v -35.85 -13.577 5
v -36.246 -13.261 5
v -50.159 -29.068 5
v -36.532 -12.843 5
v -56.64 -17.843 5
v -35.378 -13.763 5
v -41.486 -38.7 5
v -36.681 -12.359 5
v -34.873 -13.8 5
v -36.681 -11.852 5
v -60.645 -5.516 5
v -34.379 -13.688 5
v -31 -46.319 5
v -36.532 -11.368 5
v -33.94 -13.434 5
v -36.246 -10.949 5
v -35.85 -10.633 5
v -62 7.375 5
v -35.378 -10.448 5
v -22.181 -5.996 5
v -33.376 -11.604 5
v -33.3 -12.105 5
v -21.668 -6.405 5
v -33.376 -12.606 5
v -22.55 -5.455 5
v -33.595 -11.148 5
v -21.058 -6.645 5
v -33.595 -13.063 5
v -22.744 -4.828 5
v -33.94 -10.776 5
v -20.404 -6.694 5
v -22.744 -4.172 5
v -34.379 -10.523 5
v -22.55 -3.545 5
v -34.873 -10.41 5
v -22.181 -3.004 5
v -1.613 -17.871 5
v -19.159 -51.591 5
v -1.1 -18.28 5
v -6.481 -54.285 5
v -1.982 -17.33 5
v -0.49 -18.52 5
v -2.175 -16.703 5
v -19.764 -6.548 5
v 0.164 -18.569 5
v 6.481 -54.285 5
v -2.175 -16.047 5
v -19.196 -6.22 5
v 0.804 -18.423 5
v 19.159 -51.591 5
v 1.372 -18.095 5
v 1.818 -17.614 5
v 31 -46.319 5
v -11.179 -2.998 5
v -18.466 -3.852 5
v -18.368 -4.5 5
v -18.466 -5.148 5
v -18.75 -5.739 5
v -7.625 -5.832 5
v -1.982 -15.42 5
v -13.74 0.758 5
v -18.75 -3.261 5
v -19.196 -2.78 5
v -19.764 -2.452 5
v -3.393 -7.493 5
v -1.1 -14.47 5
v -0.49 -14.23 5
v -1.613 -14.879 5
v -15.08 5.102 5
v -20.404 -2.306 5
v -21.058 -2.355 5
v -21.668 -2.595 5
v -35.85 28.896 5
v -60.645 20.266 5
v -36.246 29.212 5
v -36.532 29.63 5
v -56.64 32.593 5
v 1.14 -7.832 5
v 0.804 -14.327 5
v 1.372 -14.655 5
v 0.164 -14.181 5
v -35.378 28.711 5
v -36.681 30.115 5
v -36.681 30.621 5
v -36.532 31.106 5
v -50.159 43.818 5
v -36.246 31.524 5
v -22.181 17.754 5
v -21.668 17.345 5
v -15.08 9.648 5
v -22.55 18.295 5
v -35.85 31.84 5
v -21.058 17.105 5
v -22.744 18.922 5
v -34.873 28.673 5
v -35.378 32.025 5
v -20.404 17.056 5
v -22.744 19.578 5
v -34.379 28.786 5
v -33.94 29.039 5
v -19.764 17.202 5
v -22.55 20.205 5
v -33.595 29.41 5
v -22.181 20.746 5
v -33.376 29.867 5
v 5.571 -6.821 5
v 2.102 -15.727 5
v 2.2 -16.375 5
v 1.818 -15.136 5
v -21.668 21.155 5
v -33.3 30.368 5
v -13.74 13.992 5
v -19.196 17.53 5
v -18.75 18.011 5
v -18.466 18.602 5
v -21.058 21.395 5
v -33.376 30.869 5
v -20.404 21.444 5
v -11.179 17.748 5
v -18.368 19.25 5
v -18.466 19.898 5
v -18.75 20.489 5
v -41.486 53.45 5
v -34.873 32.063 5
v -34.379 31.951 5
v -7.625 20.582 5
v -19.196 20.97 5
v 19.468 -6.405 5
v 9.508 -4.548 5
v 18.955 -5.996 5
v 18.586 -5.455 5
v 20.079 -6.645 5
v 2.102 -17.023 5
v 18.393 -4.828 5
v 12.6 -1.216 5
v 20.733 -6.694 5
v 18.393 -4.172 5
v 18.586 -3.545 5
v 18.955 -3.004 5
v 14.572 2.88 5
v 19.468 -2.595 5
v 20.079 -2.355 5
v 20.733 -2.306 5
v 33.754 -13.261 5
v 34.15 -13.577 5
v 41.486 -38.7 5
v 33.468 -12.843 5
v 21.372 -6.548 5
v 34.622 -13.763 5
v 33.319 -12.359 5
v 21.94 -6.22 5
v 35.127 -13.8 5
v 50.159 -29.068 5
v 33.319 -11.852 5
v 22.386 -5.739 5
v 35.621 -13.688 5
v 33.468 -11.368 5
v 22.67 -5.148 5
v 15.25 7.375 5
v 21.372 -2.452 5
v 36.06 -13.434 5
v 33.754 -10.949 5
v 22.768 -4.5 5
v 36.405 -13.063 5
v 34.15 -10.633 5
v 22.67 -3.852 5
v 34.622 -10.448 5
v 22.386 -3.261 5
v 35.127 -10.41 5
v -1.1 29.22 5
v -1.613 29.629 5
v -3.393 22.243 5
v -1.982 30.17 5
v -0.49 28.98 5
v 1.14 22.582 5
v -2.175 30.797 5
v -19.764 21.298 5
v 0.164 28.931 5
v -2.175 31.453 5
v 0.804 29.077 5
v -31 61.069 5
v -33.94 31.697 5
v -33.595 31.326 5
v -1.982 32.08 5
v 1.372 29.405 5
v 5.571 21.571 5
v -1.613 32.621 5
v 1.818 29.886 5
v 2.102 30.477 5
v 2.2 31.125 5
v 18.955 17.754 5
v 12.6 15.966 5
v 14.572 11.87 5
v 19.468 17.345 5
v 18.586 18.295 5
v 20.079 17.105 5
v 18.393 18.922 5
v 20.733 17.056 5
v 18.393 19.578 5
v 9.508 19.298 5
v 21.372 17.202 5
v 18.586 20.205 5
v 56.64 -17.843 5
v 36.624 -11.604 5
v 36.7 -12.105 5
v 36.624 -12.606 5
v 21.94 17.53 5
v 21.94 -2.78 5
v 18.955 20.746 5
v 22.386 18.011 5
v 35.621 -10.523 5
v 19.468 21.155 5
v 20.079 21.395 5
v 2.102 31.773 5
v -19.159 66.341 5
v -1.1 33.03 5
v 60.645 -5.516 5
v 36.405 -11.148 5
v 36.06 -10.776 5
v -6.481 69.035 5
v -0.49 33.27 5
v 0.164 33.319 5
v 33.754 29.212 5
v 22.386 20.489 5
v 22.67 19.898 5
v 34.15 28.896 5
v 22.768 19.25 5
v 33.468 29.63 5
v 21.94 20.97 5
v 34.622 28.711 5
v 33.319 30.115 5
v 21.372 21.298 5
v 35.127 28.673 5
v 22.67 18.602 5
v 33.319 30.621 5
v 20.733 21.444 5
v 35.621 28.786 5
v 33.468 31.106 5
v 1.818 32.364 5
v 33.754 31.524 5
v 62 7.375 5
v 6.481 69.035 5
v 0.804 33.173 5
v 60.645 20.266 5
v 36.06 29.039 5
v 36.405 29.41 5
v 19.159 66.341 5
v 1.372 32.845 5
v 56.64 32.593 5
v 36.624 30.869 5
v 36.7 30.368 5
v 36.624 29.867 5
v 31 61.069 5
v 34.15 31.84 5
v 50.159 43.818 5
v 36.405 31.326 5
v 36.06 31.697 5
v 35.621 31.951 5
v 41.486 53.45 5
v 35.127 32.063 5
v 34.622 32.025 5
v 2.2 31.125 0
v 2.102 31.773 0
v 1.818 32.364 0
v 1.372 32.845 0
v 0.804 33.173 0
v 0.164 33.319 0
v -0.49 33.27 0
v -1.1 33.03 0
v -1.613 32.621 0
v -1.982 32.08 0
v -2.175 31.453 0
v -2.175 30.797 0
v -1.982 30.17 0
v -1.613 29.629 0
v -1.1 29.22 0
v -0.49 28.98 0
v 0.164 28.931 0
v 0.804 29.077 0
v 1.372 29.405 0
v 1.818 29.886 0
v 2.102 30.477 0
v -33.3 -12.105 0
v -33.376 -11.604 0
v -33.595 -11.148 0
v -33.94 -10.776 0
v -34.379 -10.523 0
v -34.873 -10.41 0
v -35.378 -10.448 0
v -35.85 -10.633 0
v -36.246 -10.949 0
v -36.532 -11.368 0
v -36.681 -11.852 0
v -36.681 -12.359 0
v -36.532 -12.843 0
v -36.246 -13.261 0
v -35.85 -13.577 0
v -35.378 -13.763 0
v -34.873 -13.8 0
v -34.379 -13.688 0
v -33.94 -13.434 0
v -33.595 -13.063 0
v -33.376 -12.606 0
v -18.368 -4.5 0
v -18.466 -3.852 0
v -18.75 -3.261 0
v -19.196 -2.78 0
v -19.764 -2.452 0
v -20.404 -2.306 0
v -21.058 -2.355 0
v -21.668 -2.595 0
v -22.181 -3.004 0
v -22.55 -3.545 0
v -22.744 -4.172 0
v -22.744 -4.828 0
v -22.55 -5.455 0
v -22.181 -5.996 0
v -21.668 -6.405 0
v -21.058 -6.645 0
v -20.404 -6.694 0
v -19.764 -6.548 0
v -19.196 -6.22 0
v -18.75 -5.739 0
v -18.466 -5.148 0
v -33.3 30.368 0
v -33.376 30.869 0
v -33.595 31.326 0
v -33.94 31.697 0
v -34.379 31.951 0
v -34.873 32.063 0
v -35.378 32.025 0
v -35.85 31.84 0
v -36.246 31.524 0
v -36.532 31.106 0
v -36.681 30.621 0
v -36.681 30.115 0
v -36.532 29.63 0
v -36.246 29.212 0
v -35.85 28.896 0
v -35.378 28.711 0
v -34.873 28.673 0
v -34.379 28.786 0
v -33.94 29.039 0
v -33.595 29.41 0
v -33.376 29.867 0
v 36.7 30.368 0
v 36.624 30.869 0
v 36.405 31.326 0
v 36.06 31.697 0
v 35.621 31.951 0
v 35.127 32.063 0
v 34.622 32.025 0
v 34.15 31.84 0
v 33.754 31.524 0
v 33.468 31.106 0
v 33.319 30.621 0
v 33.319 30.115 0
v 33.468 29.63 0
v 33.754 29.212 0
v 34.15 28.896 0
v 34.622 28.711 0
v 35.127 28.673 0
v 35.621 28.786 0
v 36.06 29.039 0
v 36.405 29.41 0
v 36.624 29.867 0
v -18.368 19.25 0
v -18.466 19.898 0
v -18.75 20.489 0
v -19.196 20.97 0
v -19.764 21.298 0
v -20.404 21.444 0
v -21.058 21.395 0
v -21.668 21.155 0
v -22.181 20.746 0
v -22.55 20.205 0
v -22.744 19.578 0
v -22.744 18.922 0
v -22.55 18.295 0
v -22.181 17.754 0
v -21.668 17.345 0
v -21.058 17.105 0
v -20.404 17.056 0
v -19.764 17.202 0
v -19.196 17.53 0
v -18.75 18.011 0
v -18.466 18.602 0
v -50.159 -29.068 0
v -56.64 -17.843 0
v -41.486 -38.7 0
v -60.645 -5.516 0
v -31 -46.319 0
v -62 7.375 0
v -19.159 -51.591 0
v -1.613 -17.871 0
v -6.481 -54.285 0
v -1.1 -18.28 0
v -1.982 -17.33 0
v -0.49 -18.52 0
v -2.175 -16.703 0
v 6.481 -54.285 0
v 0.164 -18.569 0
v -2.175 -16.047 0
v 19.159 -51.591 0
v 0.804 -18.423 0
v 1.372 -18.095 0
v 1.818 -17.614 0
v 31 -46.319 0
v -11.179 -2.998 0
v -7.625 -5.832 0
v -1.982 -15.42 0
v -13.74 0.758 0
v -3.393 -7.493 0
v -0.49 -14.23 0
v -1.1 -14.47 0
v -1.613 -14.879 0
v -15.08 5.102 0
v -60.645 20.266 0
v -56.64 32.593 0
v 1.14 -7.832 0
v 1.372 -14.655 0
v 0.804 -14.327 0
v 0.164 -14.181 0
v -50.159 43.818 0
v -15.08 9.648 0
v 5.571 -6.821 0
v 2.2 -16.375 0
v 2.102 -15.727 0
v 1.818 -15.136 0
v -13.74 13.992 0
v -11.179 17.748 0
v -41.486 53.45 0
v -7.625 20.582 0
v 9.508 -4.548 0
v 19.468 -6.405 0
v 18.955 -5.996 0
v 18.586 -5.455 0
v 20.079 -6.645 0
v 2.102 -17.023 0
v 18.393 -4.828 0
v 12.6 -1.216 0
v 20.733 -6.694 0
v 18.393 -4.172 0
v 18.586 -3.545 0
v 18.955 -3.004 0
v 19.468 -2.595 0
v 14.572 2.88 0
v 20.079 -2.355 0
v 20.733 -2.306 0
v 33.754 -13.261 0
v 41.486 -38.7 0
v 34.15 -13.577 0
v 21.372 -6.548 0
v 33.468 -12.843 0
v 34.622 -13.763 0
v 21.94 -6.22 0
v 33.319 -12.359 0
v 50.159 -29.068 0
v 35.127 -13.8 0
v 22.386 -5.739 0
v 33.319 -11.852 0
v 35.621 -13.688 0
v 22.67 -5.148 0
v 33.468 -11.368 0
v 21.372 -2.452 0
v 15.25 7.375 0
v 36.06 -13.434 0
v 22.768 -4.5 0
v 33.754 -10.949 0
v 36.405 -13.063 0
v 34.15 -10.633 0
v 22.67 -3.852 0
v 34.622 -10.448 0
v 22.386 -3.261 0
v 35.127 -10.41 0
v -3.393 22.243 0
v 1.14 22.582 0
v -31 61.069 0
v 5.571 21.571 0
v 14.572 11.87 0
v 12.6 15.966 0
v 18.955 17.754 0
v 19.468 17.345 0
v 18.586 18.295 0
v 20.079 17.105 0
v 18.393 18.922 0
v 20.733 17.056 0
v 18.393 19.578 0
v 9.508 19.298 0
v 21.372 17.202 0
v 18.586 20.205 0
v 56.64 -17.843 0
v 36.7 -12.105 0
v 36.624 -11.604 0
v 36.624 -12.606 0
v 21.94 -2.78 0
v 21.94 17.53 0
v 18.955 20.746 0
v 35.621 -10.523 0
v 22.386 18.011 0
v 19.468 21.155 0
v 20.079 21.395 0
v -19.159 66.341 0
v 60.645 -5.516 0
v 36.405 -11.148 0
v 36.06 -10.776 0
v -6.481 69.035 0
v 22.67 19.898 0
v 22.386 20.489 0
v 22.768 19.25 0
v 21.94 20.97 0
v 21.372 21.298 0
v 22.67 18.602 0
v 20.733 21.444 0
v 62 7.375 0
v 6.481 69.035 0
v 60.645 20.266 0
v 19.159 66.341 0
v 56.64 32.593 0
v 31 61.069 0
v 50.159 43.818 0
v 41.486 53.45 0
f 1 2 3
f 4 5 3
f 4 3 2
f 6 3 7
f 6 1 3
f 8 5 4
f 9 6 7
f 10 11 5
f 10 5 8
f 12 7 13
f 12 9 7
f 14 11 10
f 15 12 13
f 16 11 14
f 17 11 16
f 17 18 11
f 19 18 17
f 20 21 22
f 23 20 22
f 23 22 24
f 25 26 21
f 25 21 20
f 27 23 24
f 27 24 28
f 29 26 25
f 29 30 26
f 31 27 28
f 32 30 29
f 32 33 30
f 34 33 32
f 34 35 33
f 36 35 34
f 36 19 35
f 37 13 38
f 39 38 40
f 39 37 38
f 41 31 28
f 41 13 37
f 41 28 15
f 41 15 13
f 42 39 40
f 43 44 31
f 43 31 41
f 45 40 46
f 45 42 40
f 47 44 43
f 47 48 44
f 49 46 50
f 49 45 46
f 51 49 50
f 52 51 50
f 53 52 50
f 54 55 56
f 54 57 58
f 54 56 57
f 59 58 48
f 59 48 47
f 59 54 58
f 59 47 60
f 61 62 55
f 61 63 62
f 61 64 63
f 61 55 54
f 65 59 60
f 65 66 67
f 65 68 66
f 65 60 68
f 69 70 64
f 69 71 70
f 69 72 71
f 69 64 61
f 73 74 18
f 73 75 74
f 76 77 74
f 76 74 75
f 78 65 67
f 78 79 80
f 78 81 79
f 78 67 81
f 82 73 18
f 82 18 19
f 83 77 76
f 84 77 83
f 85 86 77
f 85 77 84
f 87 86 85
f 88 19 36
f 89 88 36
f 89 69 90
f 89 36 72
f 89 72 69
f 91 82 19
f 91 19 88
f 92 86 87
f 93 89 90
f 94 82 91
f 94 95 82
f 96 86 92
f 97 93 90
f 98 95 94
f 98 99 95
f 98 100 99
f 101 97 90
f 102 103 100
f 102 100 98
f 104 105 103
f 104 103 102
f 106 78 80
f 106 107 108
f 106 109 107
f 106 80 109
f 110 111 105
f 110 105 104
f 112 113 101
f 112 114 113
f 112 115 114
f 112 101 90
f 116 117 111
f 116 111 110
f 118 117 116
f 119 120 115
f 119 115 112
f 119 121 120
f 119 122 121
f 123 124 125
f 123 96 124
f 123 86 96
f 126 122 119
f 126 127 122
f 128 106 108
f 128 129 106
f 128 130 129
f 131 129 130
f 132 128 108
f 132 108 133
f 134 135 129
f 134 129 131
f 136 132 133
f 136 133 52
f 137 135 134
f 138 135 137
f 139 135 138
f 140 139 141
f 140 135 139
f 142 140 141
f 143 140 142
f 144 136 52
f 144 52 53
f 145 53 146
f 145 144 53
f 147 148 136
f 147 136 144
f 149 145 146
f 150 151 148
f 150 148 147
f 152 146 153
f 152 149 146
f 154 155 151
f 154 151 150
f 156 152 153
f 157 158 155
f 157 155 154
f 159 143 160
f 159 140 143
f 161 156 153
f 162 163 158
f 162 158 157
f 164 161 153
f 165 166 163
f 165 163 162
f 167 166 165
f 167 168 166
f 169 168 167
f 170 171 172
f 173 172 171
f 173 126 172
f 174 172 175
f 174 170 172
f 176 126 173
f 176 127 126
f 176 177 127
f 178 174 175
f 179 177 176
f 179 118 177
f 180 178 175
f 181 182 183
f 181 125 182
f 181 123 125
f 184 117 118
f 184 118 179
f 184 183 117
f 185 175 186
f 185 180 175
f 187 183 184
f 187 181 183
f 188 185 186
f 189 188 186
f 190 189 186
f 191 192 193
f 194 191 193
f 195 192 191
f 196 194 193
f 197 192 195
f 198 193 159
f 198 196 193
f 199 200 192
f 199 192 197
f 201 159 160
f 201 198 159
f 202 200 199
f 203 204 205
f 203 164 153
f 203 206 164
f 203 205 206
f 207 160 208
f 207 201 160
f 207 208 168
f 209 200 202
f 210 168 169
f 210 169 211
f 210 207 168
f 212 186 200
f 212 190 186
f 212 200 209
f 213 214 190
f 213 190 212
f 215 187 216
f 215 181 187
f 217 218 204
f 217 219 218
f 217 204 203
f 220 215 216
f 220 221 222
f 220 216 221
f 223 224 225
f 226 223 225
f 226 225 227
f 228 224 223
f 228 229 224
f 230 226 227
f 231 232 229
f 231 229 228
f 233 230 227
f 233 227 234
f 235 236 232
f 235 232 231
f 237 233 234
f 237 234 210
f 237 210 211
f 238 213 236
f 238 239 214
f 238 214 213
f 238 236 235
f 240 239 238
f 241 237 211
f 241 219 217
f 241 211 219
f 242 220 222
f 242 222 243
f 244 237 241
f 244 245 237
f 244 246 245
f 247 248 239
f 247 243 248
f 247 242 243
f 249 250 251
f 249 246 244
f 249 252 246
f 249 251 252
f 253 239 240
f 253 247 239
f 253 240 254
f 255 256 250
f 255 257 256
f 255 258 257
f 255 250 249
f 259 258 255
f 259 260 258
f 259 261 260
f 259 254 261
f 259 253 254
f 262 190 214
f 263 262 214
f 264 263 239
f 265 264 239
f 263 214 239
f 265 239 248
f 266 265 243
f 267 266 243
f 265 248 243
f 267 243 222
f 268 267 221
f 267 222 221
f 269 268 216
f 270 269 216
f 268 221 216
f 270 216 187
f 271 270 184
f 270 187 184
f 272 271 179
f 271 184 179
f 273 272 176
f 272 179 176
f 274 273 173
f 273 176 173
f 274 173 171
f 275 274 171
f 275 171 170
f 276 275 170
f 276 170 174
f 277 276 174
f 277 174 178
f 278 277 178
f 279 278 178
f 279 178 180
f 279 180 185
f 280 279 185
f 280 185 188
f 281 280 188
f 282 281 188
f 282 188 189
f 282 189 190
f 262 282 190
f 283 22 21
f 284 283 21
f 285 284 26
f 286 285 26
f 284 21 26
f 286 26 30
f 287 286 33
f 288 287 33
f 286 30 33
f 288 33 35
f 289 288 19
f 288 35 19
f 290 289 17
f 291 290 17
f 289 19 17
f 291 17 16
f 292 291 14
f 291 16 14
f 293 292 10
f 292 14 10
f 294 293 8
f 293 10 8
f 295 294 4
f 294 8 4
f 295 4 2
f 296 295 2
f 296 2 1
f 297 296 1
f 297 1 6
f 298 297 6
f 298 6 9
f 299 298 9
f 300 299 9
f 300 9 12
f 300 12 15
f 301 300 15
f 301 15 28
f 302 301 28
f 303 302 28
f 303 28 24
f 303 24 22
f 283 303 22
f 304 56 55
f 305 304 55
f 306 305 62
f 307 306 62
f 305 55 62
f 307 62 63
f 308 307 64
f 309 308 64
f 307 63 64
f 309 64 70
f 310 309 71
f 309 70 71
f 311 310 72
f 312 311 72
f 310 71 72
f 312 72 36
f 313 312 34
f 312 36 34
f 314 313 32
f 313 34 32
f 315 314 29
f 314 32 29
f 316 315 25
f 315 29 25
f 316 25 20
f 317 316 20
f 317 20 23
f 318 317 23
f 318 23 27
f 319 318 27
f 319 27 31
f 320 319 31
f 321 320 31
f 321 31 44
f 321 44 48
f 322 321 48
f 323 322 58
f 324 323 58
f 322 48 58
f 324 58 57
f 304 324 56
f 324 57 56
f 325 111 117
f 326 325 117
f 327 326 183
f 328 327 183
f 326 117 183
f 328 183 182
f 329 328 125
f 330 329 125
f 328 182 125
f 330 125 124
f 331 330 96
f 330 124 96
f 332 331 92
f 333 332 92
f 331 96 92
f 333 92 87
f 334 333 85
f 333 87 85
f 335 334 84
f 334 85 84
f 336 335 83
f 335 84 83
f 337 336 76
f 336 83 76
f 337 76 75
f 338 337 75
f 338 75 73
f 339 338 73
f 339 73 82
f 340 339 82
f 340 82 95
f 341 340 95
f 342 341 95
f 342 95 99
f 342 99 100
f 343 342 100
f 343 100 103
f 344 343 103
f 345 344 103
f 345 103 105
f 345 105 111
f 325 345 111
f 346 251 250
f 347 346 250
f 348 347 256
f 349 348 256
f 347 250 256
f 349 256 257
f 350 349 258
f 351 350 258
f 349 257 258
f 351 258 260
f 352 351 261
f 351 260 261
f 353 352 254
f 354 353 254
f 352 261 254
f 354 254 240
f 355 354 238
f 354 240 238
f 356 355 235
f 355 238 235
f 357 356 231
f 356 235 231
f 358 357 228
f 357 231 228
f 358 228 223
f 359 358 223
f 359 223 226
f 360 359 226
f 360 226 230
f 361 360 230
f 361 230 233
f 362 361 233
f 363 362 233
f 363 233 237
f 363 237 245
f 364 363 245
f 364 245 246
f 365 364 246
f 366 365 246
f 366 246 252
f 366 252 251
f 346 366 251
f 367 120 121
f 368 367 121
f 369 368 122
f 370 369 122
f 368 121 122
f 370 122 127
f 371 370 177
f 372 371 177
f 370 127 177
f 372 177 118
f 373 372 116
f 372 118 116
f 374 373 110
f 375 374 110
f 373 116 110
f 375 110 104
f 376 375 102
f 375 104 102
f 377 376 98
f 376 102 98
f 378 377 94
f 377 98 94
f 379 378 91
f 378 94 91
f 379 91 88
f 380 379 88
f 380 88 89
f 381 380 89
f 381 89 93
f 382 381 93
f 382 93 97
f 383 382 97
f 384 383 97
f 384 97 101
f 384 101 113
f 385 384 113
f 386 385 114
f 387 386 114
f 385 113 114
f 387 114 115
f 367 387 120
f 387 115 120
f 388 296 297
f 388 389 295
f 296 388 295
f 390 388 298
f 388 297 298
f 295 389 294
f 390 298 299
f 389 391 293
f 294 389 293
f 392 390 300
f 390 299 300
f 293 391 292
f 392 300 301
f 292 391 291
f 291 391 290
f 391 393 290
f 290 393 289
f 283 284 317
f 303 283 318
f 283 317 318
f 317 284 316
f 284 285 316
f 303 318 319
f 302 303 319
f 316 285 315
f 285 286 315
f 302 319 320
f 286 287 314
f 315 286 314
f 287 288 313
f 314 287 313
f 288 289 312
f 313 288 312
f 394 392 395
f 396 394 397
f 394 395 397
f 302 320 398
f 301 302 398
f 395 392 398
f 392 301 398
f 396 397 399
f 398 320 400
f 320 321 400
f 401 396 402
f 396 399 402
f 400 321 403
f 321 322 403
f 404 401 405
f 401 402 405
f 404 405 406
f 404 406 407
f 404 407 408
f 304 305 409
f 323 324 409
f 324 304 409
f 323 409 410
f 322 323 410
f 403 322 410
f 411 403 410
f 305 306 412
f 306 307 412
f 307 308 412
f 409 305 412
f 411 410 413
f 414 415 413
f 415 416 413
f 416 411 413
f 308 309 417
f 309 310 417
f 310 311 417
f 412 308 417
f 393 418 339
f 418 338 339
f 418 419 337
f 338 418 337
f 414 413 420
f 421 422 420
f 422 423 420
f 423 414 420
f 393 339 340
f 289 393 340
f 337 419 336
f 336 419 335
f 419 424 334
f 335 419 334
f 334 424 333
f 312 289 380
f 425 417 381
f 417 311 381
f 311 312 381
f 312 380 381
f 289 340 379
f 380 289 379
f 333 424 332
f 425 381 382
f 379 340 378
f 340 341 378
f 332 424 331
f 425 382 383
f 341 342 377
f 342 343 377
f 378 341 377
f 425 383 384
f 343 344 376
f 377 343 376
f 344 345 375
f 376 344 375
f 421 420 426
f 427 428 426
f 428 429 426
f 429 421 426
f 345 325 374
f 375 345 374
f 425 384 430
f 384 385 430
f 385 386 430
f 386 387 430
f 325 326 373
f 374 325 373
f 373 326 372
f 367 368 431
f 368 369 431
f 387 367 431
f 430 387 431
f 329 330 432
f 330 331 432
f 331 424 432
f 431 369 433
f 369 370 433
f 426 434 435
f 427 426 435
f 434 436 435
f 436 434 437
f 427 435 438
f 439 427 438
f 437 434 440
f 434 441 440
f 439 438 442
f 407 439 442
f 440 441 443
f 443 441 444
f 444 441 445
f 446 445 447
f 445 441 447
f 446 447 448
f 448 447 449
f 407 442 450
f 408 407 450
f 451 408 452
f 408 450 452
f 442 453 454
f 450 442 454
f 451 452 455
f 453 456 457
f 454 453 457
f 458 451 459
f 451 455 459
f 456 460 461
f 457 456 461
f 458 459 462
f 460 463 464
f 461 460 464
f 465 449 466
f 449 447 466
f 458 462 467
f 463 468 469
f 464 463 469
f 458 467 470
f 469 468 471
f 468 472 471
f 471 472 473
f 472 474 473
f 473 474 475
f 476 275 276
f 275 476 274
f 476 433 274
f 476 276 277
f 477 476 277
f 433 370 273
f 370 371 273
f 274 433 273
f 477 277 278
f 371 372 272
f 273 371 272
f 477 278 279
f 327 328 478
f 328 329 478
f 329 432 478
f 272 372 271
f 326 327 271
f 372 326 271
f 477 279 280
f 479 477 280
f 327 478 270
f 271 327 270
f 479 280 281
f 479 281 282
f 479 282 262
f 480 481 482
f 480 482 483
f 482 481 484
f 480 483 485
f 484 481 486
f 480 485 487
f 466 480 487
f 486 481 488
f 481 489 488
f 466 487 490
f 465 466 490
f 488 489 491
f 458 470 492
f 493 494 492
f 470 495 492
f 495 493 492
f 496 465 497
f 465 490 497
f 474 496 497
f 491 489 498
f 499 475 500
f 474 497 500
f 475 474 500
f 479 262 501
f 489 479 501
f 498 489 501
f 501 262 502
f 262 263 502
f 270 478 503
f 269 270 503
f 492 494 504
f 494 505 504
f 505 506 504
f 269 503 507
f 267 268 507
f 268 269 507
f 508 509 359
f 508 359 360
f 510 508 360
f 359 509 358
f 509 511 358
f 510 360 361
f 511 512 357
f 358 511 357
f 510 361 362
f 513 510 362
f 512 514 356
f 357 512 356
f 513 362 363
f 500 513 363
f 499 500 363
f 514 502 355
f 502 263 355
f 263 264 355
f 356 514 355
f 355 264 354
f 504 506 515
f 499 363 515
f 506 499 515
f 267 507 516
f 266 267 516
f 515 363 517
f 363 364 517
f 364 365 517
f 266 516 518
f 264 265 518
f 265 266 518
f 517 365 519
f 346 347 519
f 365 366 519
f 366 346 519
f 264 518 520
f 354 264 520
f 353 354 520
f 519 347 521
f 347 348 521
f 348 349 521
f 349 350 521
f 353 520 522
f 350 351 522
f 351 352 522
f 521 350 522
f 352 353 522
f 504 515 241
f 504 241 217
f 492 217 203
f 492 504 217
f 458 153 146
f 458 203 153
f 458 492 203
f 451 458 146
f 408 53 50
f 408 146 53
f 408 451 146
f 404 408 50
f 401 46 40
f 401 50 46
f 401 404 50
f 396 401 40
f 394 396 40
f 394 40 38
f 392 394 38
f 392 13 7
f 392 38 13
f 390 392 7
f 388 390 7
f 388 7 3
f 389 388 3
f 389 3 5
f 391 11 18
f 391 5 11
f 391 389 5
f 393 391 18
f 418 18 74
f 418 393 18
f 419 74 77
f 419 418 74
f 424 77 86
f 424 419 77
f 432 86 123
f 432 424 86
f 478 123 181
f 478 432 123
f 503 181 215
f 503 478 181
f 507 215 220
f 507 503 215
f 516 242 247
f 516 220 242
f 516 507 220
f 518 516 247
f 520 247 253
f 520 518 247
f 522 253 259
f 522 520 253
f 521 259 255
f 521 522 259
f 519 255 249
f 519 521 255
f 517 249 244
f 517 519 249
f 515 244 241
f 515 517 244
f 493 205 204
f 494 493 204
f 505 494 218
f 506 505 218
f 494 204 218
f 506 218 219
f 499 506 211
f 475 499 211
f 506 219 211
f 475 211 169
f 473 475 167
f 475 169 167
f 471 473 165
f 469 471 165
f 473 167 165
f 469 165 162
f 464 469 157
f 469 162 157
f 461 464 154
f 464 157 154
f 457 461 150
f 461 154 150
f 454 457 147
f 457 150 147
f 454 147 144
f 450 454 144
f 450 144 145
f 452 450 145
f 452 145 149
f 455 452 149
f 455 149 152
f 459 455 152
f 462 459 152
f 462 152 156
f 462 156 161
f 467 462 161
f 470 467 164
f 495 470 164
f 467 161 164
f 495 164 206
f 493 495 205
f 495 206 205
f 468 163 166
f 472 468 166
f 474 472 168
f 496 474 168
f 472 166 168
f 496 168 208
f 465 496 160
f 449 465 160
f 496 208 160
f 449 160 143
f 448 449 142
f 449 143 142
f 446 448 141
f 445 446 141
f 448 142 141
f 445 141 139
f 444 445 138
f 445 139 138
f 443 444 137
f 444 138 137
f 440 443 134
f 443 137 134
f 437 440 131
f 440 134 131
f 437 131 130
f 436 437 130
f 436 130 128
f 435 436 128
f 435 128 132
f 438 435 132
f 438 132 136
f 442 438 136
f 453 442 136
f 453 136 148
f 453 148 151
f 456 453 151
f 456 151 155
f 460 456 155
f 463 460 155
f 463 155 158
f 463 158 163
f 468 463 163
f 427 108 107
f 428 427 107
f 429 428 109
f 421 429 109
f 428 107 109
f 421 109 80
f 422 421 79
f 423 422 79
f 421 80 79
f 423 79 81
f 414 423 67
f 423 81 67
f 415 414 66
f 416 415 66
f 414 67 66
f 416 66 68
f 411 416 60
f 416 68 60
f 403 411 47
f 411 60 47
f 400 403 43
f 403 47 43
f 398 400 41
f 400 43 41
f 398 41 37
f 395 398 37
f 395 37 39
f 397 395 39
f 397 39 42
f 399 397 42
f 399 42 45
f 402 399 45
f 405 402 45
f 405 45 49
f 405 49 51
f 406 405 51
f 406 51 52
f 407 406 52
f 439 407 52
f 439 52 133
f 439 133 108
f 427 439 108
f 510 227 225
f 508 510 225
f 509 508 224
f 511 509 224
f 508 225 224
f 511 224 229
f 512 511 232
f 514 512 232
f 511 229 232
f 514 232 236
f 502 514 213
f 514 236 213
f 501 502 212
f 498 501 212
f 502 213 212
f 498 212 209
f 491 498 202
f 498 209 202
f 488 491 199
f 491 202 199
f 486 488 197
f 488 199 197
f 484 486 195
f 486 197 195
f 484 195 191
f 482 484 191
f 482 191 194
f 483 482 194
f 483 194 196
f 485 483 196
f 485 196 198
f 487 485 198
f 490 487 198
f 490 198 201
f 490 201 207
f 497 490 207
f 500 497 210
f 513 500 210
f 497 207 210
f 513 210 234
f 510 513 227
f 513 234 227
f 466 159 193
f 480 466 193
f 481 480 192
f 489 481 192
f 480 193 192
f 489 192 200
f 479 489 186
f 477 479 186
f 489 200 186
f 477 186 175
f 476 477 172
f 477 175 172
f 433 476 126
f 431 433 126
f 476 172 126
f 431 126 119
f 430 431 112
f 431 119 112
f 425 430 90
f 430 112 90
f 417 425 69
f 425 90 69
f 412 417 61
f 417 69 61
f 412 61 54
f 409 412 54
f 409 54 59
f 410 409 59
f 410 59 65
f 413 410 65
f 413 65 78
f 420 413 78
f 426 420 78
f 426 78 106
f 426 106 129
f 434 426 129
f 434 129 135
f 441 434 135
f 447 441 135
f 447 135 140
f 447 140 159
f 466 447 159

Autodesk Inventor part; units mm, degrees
ref_plane "YZ Plane" through (0, 0, 0) normal (1, 0, 0) x (0, 1, 0)
ref_plane "XZ Plane" through (0, 0, 0) normal (0, 1, 0) x (-1, 0, 0)
ref_plane "XY Plane" through (0, 0, 0) normal (0, 0, 1) x (1, 0, 0)
sketch "Base" plane through (0, 0, 0) normal (0, 0, 1) x (1, 0, 0)
  circle A0 centre (0, 7.375) radius 56.125 construction
  line L0 (0, -79.425) -> (0, 94.175) construction
  circle A1 centre (0, 7.375) radius 62
  line L1 (-34.5, -17.2623) -> (-48.798, -11.1931) construction
  point P0 (0, 0)
  point P1 (0, -28.5)
  dimension "d1" = 124
  dimension "d39" = 5.875
extrude "Plate1" add sketch "Base" along normal blind 5
sketch "HubCenterHole" plane through (0, 7.375, 5) normal (0, 0, 1) x (1, 0, 0)
  circle A0 centre (0, 0) radius 15 construction
  circle A1 centre (0, 0) radius 15.25
  point P0 (0, -7.375)
  dimension "d79" = 0.25
extrude "HubCenterHoleFeature" cut sketch "HubCenterHole" against normal blind 5
sketch "HubMountHoles" plane through (0, 7.375, 5) normal (0, 0, 1) x (1, 0, 0)
  circle A0 centre (0, -23.75) radius 2.5 construction
  circle A1 centre (-20.5681, -11.875) radius 2.5 construction
  circle A2 centre (-20.5681, 11.875) radius 2.5 construction
  circle A3 centre (0, 23.75) radius 2.5 construction
  circle A4 centre (20.5681, 11.875) radius 2.5 construction
  circle A5 centre (20.5681, -11.875) radius 2.5 construction
  circle A6 centre (0, -23.75) radius 2.5 construction
  circle A7 centre (0, -23.75) radius 2.2
  circle A8 centre (20.5681, -11.875) radius 2.2
  circle A9 centre (20.5681, 11.875) radius 2.2
  circle A10 centre (0, 23.75) radius 2.2
  circle A11 centre (-20.5681, -11.875) radius 2.2
  circle A12 centre (-20.5681, 11.875) radius 2.2
  point P0 (0, -7.375)
extrude "HubMountHolesFeature" cut sketch "HubMountHoles" against normal blind 5
sketch "BracketMountHoles" plane through (0, 7.375, 5) normal (0, 0, 1) x (1, 0, 0)
  circle A0 centre (-35, -19.4802) radius 2 construction
  circle A1 centre (35, -19.4802) radius 2 construction
  circle A2 centre (-35, 22.9931) radius 2 construction
  circle A3 centre (-35, -19.4802) radius 2 construction
  arc A4 (-56, -19.7436) -> (-50, -25.7436) centre (-50, -19.7436) ccw construction
  line L0 (-22, -25.7436) -> (-50, -25.7436) construction
  line L1 (-22, -25.7436) -> (-22, 29.2564) construction
  line L2 (-50, 29.2564) -> (-22, 29.2564) construction
  arc A5 (-50, 29.2564) -> (-56, 23.2564) centre (-50, 23.2564) ccw construction
  line L3 (-56, -19.7436) -> (-56, 23.2564) construction
  circle A6 centre (35, 22.9931) radius 2 construction
  circle A7 centre (35, -19.4802) radius 2 construction
  arc A8 (50, -25.7436) -> (56, -19.7436) centre (50, -19.7436) ccw construction
  line L4 (56, -19.7436) -> (56, 23.2564) construction
  arc A9 (56, 23.2564) -> (50, 29.2564) centre (50, 23.2564) ccw construction
  line L5 (50, 29.2564) -> (22, 29.2564) construction
  line L6 (22, -25.7436) -> (22, 29.2564) construction
  line L7 (22, -25.7436) -> (50, -25.7436) construction
  circle A10 centre (-35, -19.4802) radius 1.7
  circle A11 centre (-35, 22.9931) radius 1.7
  circle A12 centre (35, -19.4802) radius 1.7
  circle A13 centre (35, 22.9931) radius 1.7
  point P0 (0, -7.375)
  dimension "d88" = 4
  dimension "d89" = 3.4
  dimension "d90" = 3.4
  dimension "d91" = 3.4
  dimension "d92" = 3.4
extrude "BracketMountHolesFeature" cut sketch "BracketMountHoles" against normal blind 5
equation "\"d12\" = Thickness"
equation "\"BendRadius\" = Thickness"
equation "\"BendReliefWidth\" = Thickness"
equation "\"BendReliefDepth\" = 0.5 * Thickness"
equation "\"TransitionRadius\" = BendRadius"
equation "\"JacobiRadiusSize\" = BendRadius"
equation "\"GapSize\" = Thickness"
equation "\"Thickness\" = 5"
properties part number "NeckBase"
